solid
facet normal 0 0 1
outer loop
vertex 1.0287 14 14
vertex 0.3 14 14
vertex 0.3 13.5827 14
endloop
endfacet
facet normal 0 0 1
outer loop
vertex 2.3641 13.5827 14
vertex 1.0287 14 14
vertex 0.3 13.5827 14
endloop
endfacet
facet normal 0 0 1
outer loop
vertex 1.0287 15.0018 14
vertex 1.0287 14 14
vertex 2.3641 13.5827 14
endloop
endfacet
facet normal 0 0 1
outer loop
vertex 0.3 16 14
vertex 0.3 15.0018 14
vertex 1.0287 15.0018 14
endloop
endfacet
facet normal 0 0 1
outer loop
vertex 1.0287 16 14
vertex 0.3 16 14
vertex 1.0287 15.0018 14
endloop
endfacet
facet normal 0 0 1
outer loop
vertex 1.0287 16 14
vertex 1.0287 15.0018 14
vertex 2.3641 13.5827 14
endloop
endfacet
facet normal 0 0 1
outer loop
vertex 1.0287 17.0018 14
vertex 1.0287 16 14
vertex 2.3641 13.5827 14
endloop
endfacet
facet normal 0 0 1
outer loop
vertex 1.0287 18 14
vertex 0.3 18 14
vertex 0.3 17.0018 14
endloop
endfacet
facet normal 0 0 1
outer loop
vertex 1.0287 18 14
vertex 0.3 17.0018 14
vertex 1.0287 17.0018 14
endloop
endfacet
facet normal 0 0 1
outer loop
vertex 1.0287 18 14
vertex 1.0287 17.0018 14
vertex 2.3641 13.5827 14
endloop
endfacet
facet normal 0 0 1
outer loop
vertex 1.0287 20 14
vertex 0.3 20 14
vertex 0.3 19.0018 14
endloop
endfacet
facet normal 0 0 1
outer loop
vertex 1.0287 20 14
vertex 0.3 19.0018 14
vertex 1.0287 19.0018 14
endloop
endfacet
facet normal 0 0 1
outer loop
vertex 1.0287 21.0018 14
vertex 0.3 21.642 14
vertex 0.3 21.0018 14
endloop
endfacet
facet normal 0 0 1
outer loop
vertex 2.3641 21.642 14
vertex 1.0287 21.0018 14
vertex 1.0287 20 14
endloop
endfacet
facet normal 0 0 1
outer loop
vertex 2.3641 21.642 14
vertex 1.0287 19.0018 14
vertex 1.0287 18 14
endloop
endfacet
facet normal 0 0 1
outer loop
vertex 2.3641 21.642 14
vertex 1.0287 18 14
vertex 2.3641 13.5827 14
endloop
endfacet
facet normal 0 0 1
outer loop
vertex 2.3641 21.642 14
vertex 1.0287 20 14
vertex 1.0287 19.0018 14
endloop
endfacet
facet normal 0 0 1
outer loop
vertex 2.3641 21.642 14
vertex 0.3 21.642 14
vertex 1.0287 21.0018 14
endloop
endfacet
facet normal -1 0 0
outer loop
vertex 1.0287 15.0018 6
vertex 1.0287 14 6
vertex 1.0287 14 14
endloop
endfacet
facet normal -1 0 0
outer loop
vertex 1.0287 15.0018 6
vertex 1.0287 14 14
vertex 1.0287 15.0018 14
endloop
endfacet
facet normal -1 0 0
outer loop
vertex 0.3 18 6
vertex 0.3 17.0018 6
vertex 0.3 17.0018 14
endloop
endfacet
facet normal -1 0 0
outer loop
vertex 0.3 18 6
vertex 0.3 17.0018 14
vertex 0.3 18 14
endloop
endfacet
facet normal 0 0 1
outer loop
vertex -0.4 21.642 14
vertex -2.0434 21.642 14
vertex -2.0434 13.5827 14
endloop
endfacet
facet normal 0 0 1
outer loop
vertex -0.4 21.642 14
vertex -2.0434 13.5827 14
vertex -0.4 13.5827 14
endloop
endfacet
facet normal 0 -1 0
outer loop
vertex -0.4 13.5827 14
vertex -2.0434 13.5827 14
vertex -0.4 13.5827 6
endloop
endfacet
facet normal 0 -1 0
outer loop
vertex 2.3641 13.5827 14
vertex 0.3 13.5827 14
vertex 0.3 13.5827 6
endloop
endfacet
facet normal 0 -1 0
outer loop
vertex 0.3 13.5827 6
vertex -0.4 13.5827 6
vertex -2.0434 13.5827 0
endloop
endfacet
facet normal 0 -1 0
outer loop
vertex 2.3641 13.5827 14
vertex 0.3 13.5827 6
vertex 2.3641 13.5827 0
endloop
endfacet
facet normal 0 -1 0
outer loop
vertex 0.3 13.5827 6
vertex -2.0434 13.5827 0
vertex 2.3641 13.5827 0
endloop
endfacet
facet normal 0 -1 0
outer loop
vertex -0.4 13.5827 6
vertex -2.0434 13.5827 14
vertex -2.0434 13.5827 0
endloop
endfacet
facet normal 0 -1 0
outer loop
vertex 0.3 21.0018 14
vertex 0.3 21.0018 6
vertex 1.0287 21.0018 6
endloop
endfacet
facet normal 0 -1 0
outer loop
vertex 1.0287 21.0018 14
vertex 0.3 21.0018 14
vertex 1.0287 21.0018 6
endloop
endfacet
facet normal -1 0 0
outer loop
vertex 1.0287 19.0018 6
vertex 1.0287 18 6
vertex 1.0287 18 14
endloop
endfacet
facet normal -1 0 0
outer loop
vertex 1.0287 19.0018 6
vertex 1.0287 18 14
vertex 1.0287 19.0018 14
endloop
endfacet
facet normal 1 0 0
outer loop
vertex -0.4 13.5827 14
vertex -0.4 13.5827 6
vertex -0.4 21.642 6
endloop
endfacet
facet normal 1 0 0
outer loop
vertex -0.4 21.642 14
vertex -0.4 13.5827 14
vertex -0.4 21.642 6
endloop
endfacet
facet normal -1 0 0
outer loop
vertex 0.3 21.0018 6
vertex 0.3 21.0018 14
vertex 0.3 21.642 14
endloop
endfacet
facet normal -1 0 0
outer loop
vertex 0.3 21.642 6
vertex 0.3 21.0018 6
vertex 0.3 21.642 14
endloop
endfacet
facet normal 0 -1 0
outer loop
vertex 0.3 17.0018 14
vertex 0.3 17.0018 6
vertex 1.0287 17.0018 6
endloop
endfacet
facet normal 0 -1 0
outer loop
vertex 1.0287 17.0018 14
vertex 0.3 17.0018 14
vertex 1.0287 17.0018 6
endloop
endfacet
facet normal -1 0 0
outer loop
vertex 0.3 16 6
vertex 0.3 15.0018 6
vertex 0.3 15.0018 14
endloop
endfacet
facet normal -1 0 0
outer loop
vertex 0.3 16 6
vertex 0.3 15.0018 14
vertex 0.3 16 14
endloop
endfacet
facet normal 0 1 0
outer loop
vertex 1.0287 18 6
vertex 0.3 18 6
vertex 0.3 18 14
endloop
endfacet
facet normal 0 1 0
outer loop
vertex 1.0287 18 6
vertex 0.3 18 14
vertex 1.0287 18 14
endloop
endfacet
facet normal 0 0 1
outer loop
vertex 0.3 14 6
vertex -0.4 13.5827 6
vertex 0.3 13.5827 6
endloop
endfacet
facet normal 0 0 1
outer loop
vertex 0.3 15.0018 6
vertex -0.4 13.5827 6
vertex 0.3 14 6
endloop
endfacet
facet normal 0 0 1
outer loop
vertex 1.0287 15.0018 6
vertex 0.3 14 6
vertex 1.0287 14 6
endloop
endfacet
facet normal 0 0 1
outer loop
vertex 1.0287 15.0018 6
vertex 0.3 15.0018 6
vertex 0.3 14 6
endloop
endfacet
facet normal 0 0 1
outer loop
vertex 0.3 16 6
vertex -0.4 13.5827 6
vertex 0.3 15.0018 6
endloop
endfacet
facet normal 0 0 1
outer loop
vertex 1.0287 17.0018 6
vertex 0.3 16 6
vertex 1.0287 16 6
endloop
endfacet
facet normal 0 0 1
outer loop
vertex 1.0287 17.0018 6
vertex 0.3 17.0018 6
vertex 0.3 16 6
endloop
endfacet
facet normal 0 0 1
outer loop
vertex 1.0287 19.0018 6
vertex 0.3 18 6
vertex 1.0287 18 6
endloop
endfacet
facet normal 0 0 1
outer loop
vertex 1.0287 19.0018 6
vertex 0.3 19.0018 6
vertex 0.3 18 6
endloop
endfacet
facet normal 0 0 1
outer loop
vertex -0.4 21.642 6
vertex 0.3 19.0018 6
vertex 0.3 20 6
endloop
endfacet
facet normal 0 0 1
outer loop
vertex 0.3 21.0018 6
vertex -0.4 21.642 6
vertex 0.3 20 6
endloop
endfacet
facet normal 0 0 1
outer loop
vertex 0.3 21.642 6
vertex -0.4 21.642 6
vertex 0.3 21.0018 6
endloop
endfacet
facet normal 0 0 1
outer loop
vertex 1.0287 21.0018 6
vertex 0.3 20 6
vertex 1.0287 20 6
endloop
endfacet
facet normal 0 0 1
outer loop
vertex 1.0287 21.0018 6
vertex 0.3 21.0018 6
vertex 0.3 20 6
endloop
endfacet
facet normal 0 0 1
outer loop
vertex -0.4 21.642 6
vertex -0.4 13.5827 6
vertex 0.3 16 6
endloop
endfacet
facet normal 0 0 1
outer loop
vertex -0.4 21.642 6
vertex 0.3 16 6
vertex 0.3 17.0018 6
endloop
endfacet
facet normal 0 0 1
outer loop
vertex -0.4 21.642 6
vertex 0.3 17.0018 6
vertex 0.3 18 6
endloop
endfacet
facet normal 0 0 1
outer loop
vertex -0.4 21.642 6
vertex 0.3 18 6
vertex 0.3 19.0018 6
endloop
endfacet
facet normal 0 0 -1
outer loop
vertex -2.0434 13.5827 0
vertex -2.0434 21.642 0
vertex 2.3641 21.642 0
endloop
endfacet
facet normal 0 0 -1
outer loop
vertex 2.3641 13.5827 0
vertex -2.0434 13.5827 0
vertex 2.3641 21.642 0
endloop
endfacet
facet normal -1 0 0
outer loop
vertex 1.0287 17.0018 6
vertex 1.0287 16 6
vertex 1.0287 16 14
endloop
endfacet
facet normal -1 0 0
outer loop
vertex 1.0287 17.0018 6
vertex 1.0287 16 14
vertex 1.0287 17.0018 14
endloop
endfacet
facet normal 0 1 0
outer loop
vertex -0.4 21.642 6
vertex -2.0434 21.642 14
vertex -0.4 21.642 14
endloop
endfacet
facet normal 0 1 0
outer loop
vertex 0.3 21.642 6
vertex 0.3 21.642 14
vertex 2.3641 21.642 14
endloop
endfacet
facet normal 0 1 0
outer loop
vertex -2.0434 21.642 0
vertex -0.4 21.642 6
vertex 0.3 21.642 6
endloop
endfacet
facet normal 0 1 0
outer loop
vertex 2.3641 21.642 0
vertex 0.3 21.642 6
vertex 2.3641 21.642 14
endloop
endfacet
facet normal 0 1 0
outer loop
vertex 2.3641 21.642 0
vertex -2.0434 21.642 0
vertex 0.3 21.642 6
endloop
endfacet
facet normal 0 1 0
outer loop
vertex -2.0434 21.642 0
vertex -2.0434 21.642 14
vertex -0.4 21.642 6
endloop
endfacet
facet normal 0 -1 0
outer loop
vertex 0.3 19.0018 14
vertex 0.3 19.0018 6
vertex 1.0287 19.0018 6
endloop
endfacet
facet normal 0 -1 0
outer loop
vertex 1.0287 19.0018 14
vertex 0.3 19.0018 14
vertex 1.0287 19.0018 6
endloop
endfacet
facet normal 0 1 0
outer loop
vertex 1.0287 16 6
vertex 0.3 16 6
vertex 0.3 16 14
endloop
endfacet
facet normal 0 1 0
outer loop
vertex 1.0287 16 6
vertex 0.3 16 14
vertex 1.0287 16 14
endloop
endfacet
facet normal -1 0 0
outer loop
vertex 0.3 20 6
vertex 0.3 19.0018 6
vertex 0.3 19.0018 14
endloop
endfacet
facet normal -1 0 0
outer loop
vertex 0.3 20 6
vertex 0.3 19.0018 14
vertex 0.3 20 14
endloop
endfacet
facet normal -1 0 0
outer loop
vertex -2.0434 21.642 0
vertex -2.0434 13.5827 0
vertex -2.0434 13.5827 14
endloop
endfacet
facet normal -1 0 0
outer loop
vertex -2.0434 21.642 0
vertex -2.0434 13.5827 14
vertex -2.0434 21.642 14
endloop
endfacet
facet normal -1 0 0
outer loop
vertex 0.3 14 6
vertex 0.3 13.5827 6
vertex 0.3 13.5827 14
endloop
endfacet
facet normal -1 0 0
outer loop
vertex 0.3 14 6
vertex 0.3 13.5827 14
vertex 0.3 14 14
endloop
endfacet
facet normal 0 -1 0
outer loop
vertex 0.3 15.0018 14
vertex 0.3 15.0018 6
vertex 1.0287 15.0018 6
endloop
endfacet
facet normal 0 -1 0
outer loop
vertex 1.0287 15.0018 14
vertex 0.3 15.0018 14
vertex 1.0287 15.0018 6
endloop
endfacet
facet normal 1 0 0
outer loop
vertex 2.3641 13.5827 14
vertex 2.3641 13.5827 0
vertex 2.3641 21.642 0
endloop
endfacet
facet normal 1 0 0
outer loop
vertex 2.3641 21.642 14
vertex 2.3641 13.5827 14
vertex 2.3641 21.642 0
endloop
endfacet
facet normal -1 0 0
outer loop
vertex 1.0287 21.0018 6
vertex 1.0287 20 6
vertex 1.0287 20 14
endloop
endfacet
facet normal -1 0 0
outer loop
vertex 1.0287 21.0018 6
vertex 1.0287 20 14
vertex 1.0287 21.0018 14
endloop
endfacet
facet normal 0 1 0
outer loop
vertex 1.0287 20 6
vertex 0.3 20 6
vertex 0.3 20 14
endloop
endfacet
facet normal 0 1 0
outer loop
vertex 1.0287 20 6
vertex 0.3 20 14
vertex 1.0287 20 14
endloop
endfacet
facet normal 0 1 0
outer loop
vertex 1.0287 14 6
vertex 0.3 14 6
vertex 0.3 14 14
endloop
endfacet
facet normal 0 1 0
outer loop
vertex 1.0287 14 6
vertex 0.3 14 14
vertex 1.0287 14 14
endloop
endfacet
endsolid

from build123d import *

# Parameters (mm, degrees)
DWIRE007_W       = 1.028705
DWIRE007_H       = 1.001781
EXTRUDE007_DEPTH = 9
ARRAY001_Y_COUNT = 20
ARRAY001_Y_PITCH = 2
DWIRE016_W       = 0.7
DWIRE016_H       = 38.839707
EXTRUDE019_DEPTH = 9
DWIRE017_W       = 4.407525
DWIRE017_H       = 8.059332
EXTRUDE020_DEPTH = 14


with BuildPart() as zeby_paska:
    # DWire007 → Extrude007 (new body)
    with BuildSketch(Plane.XY):
        with Locations((0.514352, 0.500891)):
            Rectangle(DWIRE007_W, DWIRE007_H)
    extrude(amount=EXTRUDE007_DEPTH)


with BuildPart() as zeby_paska_1:
    # Extrude007 placement: moved
    add(zeby_paska.part.moved(Location((0, 0, 6))))

    # Array001 Y: zeby paska ×20


with BuildPart() as zeby_paska_2:
    add(zeby_paska_1.part)
    with Locations(*[(0, i * ARRAY001_Y_PITCH, 0) for i in range(1, ARRAY001_Y_COUNT)]):
        add(zeby_paska_1.part)


with BuildPart() as pasek:
    # DWire016 → Extrude019 (new body)
    with BuildSketch(Plane.XY):
        with Locations((-0.05, 19.419853)):
            Rectangle(DWIRE016_W, DWIRE016_H)
    extrude(amount=EXTRUDE019_DEPTH)


with BuildPart() as pasek_1:
    # Extrude019 placement: moved
    add(pasek.part.moved(Location((0, 0, 6))))

    # Fusion002: union zeby paska
    add(zeby_paska_2.part)


with BuildPart() as test_wyciecie_na_pasek:
    # DWire017 → Extrude020 (new body)
    with BuildSketch(Plane.XY):
        with Locations((0.16035, 17.61238)):
            Rectangle(DWIRE017_W, DWIRE017_H)
    extrude(amount=EXTRUDE020_DEPTH)

    # Cut015: cut pasek
    add(pasek_1.part, mode=Mode.SUBTRACT)


solid = test_wyciecie_na_pasek.part
